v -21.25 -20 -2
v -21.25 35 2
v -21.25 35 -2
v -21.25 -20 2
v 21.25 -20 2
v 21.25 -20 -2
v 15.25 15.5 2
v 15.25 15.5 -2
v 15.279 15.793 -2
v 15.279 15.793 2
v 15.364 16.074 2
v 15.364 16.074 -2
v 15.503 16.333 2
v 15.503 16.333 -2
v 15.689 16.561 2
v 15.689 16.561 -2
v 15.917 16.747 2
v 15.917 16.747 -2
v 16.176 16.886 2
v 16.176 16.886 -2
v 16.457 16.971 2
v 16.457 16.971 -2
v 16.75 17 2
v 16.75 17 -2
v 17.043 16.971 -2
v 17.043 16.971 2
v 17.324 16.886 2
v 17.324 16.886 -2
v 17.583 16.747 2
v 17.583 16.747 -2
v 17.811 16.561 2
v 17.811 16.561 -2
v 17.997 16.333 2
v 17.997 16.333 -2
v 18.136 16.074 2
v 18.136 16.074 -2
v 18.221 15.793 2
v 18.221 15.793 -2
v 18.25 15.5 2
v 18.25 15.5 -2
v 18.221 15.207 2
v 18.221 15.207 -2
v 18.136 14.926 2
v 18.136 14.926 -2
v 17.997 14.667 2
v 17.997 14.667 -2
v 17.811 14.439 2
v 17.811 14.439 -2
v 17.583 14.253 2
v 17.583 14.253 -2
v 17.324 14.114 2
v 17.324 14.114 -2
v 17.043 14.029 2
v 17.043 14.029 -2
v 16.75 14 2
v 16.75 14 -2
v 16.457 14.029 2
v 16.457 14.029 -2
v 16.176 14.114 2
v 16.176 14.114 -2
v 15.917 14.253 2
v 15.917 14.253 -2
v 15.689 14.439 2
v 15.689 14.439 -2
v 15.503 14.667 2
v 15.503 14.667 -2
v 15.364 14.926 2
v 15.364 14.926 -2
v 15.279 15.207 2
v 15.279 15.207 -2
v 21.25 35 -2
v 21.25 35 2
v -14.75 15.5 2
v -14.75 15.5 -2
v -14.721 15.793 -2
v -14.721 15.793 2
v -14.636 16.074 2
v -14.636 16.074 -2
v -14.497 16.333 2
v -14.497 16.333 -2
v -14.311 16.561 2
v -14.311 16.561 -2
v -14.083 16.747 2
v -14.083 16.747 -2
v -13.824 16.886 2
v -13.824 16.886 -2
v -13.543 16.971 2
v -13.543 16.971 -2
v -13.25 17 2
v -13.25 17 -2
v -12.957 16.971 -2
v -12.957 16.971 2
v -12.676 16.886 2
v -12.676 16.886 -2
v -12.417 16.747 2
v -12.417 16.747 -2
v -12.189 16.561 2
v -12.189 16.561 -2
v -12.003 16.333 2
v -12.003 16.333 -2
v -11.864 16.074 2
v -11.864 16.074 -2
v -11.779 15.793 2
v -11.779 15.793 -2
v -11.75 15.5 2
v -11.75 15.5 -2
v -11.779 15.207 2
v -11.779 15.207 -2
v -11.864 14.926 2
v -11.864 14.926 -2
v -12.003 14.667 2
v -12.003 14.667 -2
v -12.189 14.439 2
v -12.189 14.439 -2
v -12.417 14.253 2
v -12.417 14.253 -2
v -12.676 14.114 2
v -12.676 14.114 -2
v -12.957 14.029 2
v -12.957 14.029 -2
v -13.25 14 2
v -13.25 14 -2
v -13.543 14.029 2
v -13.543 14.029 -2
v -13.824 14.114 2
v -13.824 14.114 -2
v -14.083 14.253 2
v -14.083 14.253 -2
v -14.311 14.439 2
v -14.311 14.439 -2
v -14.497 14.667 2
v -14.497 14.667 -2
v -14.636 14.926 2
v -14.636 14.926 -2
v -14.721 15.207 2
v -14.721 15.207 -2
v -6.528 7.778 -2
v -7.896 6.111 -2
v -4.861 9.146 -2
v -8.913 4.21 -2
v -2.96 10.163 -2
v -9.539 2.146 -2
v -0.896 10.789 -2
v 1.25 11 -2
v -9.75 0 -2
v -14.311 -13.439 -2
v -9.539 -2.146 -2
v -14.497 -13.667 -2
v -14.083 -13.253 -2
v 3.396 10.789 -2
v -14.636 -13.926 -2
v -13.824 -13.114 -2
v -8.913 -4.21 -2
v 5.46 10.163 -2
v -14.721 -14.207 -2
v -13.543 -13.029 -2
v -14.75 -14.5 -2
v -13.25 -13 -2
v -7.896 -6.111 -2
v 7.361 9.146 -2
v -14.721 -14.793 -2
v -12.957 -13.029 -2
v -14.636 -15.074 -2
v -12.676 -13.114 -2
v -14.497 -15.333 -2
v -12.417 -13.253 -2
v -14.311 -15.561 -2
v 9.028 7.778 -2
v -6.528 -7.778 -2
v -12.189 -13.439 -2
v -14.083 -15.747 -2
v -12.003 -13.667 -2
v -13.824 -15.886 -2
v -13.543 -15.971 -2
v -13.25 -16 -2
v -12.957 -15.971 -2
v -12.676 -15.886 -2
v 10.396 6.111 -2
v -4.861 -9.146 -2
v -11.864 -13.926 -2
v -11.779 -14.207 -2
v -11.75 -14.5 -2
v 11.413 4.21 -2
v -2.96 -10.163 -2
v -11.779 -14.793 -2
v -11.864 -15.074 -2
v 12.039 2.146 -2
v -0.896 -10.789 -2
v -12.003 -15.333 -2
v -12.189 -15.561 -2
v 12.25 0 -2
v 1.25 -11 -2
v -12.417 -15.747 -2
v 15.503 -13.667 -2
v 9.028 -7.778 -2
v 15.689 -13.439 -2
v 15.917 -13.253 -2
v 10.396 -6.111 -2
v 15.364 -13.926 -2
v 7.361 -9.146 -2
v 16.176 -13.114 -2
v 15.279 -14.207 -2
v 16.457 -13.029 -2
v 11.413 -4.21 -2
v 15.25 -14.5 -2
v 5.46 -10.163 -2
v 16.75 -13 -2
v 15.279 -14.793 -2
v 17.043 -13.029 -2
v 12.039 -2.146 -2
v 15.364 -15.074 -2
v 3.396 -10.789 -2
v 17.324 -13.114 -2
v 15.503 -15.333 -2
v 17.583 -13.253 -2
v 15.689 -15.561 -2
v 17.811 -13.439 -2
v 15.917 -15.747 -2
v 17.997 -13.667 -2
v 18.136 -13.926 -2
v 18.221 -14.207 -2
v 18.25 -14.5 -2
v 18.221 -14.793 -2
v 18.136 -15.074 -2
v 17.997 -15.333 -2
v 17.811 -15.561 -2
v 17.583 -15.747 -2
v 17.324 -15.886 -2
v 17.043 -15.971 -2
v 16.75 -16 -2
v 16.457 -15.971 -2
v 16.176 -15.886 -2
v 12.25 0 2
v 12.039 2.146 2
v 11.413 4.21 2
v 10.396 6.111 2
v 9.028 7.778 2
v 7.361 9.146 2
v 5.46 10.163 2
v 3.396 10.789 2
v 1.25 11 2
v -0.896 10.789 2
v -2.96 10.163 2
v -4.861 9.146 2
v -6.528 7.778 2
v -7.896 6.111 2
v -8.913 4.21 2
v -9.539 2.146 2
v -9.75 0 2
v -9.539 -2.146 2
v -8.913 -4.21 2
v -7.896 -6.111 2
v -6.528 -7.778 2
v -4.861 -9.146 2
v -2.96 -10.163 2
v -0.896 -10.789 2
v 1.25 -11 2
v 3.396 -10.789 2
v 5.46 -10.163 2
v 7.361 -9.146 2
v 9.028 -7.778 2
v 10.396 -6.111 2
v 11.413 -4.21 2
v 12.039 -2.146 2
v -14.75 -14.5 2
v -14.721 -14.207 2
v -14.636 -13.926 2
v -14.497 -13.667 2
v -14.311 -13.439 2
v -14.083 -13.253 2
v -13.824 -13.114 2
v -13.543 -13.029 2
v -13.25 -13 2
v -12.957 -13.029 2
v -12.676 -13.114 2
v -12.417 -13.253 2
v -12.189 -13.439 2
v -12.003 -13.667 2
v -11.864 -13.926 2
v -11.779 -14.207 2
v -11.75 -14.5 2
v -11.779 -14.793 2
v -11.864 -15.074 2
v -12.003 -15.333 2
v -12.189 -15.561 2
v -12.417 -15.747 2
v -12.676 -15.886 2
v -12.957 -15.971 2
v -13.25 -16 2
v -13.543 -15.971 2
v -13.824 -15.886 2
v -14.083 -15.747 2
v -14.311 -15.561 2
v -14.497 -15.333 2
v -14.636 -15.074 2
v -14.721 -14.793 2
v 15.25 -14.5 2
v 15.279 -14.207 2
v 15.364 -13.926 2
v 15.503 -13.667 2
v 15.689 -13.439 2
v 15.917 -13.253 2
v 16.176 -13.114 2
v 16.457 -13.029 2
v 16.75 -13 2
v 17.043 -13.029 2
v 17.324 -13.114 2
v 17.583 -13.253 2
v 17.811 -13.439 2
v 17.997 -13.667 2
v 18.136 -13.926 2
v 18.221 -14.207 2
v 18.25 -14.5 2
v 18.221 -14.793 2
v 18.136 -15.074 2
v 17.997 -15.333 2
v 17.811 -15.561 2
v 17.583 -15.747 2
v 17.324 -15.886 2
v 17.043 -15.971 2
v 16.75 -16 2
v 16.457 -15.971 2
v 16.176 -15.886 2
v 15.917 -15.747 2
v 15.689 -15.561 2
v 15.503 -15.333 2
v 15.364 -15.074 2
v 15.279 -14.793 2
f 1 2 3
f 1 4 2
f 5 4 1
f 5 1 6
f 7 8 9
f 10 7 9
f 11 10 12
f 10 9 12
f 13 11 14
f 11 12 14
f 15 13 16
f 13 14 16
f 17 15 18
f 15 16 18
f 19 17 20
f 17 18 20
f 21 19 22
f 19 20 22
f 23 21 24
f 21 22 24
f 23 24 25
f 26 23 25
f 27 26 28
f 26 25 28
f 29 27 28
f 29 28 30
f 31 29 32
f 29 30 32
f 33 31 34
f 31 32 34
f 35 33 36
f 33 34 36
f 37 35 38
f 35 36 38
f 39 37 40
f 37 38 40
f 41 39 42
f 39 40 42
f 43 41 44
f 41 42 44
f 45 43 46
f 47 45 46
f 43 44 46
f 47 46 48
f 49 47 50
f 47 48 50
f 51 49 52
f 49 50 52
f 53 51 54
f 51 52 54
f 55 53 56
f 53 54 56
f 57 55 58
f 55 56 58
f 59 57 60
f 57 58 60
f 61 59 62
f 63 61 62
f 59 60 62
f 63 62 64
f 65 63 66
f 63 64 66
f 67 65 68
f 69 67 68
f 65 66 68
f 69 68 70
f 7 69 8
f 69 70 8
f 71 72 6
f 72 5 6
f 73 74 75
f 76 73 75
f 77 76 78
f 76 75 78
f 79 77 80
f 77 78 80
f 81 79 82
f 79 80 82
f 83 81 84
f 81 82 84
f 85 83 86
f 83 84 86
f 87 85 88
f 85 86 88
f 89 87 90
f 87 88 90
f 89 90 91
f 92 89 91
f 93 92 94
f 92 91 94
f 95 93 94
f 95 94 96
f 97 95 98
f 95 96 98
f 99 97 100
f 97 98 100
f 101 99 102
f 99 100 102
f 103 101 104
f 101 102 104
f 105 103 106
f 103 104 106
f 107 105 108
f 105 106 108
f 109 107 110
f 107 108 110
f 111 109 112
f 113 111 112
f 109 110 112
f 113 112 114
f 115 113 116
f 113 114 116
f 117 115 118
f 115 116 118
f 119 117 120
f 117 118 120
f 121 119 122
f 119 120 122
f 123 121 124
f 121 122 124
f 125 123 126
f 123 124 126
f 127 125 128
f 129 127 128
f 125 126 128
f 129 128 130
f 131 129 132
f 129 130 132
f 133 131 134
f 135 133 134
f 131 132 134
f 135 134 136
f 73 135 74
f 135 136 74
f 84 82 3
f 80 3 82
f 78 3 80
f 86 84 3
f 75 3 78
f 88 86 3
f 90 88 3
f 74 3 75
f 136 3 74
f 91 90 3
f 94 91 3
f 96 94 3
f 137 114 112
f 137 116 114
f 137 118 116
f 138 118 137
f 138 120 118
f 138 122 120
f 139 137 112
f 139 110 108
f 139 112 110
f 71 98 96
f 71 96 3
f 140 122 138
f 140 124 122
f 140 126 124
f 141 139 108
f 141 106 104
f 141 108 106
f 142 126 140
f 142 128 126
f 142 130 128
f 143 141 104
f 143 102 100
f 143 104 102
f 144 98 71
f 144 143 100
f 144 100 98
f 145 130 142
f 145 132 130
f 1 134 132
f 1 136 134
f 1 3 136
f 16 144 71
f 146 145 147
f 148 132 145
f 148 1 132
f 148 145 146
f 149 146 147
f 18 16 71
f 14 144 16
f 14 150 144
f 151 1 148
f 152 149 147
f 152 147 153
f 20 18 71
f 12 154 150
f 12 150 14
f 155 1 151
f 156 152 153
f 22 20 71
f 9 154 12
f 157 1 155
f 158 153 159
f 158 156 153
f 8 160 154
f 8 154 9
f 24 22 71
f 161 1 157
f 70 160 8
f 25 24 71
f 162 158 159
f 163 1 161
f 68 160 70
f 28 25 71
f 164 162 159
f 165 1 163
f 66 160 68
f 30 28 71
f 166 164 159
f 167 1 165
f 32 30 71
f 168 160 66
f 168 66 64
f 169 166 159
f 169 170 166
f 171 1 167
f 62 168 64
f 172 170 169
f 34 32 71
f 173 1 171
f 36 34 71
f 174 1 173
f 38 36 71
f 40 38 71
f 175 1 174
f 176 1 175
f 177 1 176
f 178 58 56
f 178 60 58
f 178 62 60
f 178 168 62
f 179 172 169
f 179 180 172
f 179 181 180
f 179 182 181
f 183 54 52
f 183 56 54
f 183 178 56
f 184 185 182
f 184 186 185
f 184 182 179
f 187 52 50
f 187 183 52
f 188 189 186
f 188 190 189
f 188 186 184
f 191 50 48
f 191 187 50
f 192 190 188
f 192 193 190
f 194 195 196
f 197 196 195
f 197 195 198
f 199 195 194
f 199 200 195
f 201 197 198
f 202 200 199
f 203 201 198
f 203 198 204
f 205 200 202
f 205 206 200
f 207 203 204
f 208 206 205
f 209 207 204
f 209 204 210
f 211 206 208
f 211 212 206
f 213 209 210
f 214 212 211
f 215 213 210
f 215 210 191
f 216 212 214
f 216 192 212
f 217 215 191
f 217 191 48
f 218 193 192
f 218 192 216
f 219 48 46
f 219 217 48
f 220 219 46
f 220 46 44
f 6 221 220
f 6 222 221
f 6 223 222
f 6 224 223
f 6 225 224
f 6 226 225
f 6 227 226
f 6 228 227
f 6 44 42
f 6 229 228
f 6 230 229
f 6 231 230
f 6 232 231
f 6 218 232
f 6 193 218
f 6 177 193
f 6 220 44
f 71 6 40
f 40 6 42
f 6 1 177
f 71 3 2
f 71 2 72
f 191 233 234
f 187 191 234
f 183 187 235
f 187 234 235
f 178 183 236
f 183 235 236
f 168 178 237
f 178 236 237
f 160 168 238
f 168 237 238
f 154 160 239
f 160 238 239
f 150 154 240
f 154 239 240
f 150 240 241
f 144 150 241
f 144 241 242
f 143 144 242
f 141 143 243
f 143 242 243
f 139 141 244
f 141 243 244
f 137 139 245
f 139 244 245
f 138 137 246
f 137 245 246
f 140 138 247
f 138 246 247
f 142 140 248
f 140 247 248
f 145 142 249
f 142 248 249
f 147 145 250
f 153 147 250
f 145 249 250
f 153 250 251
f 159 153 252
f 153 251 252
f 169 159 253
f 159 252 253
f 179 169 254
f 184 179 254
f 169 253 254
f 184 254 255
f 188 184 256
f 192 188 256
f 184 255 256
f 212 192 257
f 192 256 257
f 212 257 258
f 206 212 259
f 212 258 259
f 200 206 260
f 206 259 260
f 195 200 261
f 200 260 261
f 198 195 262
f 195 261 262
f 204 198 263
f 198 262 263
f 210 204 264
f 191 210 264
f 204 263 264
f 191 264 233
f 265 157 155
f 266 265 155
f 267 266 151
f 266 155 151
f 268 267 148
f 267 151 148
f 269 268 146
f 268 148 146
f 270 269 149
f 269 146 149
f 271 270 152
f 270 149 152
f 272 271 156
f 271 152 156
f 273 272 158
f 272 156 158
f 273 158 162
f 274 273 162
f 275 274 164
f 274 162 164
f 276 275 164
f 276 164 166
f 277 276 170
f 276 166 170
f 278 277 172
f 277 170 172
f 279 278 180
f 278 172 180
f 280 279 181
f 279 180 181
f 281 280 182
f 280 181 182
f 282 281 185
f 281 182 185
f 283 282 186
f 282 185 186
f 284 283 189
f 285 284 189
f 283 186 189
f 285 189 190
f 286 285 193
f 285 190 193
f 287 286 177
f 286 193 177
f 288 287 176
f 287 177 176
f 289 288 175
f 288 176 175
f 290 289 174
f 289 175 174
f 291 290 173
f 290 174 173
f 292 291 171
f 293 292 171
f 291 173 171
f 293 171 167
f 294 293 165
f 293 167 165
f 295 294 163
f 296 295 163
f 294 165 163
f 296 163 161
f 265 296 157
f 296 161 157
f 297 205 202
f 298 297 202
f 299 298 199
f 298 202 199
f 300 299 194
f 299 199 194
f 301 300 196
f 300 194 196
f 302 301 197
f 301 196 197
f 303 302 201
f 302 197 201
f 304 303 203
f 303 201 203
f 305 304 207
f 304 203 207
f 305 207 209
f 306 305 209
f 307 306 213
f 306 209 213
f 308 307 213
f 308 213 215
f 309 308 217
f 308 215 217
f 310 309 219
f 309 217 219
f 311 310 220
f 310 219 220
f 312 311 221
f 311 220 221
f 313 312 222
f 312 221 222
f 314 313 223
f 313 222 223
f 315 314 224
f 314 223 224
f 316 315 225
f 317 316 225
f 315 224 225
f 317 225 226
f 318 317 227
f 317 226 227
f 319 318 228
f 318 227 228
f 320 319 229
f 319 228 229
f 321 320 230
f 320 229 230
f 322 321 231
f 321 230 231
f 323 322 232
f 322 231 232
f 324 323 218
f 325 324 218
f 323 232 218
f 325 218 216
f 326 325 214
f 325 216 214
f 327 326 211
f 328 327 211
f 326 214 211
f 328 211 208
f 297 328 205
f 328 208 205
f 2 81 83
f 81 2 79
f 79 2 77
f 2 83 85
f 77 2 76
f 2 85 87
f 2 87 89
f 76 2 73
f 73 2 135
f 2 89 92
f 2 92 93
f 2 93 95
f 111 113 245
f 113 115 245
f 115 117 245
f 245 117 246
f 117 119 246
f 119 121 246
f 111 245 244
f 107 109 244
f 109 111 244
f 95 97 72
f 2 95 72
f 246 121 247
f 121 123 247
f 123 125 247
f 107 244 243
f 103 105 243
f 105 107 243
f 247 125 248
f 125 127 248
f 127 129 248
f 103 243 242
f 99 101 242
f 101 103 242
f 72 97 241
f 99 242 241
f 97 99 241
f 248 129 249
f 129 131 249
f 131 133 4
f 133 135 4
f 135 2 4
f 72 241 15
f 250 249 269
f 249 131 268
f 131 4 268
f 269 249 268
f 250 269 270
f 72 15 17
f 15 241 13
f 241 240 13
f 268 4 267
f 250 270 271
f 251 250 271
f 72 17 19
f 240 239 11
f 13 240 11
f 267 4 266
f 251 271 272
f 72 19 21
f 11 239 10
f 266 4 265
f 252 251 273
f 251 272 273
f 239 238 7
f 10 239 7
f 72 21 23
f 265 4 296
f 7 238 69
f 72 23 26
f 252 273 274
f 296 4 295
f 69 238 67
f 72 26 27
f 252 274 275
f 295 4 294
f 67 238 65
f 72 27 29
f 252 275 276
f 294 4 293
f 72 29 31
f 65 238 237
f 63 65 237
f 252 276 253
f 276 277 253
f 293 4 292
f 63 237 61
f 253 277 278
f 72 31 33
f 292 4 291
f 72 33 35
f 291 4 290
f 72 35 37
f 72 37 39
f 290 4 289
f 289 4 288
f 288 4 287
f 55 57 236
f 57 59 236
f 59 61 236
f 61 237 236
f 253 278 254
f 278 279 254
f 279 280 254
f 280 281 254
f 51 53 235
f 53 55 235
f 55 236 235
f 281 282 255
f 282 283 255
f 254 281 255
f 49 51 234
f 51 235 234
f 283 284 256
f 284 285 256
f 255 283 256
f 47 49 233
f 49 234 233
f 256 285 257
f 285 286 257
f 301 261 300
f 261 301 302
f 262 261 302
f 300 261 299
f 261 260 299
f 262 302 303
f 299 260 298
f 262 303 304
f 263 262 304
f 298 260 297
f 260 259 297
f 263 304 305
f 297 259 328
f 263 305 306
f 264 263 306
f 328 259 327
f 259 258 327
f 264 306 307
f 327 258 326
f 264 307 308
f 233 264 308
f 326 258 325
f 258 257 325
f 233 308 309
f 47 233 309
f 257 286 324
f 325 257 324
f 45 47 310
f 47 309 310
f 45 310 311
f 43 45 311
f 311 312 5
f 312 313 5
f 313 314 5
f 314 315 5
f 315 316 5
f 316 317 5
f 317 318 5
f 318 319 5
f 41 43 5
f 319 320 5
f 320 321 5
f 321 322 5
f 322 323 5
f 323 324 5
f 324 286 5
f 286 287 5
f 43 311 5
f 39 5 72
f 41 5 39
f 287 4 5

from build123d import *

# Parameters (mm, degrees)
SKETCH1_W           = 42.5
SKETCH1_H           = 40
BOSS_EXTRUDE1_DEPTH = 2
SKETCH2_R           = 1.5
CUT_EXTRUDE1_DEPTH  = 4
SKETCH3_R           = 11
CUT_EXTRUDE2_DEPTH  = 4
SKETCH4_W           = 42.5
SKETCH4_H           = 4
BOSS_EXTRUDE2_DEPTH = 15


with BuildPart() as part:
    # Sketch1 → Boss-Extrude1 (new, symmetric)
    with BuildSketch(Plane.XY):
        Rectangle(SKETCH1_W, SKETCH1_H)
    extrude(amount=BOSS_EXTRUDE1_DEPTH, both=True)

    # Sketch2 → Cut-Extrude1 (cut)
    with BuildSketch(Plane(origin=(0, 0, -2), x_dir=(-1, 0, 0), z_dir=(0, 0, -1))):
        with Locations((-16.75, 15.5)):
            Circle(SKETCH2_R)
        with Locations((13.25, 15.5)):
            Circle(SKETCH2_R)
        with Locations((13.25, -14.5)):
            Circle(SKETCH2_R)
        with Locations((-16.75, -14.5)):
            Circle(SKETCH2_R)
    extrude(amount=-CUT_EXTRUDE1_DEPTH, mode=Mode.SUBTRACT)

    # Sketch3 → Cut-Extrude2 (cut)
    with BuildSketch(Plane.XY.offset(2)):
        with Locations((1.25, 0)):
            Circle(SKETCH3_R)
    extrude(amount=-CUT_EXTRUDE2_DEPTH, mode=Mode.SUBTRACT)

    # Sketch4 → Boss-Extrude2 (add)
    with BuildSketch(Plane(origin=(0, 20, 0), x_dir=(1, 0, 0), z_dir=(0, 1, 0))):
        Rectangle(SKETCH4_W, SKETCH4_H)
    extrude(amount=BOSS_EXTRUDE2_DEPTH)


solid = part.part
